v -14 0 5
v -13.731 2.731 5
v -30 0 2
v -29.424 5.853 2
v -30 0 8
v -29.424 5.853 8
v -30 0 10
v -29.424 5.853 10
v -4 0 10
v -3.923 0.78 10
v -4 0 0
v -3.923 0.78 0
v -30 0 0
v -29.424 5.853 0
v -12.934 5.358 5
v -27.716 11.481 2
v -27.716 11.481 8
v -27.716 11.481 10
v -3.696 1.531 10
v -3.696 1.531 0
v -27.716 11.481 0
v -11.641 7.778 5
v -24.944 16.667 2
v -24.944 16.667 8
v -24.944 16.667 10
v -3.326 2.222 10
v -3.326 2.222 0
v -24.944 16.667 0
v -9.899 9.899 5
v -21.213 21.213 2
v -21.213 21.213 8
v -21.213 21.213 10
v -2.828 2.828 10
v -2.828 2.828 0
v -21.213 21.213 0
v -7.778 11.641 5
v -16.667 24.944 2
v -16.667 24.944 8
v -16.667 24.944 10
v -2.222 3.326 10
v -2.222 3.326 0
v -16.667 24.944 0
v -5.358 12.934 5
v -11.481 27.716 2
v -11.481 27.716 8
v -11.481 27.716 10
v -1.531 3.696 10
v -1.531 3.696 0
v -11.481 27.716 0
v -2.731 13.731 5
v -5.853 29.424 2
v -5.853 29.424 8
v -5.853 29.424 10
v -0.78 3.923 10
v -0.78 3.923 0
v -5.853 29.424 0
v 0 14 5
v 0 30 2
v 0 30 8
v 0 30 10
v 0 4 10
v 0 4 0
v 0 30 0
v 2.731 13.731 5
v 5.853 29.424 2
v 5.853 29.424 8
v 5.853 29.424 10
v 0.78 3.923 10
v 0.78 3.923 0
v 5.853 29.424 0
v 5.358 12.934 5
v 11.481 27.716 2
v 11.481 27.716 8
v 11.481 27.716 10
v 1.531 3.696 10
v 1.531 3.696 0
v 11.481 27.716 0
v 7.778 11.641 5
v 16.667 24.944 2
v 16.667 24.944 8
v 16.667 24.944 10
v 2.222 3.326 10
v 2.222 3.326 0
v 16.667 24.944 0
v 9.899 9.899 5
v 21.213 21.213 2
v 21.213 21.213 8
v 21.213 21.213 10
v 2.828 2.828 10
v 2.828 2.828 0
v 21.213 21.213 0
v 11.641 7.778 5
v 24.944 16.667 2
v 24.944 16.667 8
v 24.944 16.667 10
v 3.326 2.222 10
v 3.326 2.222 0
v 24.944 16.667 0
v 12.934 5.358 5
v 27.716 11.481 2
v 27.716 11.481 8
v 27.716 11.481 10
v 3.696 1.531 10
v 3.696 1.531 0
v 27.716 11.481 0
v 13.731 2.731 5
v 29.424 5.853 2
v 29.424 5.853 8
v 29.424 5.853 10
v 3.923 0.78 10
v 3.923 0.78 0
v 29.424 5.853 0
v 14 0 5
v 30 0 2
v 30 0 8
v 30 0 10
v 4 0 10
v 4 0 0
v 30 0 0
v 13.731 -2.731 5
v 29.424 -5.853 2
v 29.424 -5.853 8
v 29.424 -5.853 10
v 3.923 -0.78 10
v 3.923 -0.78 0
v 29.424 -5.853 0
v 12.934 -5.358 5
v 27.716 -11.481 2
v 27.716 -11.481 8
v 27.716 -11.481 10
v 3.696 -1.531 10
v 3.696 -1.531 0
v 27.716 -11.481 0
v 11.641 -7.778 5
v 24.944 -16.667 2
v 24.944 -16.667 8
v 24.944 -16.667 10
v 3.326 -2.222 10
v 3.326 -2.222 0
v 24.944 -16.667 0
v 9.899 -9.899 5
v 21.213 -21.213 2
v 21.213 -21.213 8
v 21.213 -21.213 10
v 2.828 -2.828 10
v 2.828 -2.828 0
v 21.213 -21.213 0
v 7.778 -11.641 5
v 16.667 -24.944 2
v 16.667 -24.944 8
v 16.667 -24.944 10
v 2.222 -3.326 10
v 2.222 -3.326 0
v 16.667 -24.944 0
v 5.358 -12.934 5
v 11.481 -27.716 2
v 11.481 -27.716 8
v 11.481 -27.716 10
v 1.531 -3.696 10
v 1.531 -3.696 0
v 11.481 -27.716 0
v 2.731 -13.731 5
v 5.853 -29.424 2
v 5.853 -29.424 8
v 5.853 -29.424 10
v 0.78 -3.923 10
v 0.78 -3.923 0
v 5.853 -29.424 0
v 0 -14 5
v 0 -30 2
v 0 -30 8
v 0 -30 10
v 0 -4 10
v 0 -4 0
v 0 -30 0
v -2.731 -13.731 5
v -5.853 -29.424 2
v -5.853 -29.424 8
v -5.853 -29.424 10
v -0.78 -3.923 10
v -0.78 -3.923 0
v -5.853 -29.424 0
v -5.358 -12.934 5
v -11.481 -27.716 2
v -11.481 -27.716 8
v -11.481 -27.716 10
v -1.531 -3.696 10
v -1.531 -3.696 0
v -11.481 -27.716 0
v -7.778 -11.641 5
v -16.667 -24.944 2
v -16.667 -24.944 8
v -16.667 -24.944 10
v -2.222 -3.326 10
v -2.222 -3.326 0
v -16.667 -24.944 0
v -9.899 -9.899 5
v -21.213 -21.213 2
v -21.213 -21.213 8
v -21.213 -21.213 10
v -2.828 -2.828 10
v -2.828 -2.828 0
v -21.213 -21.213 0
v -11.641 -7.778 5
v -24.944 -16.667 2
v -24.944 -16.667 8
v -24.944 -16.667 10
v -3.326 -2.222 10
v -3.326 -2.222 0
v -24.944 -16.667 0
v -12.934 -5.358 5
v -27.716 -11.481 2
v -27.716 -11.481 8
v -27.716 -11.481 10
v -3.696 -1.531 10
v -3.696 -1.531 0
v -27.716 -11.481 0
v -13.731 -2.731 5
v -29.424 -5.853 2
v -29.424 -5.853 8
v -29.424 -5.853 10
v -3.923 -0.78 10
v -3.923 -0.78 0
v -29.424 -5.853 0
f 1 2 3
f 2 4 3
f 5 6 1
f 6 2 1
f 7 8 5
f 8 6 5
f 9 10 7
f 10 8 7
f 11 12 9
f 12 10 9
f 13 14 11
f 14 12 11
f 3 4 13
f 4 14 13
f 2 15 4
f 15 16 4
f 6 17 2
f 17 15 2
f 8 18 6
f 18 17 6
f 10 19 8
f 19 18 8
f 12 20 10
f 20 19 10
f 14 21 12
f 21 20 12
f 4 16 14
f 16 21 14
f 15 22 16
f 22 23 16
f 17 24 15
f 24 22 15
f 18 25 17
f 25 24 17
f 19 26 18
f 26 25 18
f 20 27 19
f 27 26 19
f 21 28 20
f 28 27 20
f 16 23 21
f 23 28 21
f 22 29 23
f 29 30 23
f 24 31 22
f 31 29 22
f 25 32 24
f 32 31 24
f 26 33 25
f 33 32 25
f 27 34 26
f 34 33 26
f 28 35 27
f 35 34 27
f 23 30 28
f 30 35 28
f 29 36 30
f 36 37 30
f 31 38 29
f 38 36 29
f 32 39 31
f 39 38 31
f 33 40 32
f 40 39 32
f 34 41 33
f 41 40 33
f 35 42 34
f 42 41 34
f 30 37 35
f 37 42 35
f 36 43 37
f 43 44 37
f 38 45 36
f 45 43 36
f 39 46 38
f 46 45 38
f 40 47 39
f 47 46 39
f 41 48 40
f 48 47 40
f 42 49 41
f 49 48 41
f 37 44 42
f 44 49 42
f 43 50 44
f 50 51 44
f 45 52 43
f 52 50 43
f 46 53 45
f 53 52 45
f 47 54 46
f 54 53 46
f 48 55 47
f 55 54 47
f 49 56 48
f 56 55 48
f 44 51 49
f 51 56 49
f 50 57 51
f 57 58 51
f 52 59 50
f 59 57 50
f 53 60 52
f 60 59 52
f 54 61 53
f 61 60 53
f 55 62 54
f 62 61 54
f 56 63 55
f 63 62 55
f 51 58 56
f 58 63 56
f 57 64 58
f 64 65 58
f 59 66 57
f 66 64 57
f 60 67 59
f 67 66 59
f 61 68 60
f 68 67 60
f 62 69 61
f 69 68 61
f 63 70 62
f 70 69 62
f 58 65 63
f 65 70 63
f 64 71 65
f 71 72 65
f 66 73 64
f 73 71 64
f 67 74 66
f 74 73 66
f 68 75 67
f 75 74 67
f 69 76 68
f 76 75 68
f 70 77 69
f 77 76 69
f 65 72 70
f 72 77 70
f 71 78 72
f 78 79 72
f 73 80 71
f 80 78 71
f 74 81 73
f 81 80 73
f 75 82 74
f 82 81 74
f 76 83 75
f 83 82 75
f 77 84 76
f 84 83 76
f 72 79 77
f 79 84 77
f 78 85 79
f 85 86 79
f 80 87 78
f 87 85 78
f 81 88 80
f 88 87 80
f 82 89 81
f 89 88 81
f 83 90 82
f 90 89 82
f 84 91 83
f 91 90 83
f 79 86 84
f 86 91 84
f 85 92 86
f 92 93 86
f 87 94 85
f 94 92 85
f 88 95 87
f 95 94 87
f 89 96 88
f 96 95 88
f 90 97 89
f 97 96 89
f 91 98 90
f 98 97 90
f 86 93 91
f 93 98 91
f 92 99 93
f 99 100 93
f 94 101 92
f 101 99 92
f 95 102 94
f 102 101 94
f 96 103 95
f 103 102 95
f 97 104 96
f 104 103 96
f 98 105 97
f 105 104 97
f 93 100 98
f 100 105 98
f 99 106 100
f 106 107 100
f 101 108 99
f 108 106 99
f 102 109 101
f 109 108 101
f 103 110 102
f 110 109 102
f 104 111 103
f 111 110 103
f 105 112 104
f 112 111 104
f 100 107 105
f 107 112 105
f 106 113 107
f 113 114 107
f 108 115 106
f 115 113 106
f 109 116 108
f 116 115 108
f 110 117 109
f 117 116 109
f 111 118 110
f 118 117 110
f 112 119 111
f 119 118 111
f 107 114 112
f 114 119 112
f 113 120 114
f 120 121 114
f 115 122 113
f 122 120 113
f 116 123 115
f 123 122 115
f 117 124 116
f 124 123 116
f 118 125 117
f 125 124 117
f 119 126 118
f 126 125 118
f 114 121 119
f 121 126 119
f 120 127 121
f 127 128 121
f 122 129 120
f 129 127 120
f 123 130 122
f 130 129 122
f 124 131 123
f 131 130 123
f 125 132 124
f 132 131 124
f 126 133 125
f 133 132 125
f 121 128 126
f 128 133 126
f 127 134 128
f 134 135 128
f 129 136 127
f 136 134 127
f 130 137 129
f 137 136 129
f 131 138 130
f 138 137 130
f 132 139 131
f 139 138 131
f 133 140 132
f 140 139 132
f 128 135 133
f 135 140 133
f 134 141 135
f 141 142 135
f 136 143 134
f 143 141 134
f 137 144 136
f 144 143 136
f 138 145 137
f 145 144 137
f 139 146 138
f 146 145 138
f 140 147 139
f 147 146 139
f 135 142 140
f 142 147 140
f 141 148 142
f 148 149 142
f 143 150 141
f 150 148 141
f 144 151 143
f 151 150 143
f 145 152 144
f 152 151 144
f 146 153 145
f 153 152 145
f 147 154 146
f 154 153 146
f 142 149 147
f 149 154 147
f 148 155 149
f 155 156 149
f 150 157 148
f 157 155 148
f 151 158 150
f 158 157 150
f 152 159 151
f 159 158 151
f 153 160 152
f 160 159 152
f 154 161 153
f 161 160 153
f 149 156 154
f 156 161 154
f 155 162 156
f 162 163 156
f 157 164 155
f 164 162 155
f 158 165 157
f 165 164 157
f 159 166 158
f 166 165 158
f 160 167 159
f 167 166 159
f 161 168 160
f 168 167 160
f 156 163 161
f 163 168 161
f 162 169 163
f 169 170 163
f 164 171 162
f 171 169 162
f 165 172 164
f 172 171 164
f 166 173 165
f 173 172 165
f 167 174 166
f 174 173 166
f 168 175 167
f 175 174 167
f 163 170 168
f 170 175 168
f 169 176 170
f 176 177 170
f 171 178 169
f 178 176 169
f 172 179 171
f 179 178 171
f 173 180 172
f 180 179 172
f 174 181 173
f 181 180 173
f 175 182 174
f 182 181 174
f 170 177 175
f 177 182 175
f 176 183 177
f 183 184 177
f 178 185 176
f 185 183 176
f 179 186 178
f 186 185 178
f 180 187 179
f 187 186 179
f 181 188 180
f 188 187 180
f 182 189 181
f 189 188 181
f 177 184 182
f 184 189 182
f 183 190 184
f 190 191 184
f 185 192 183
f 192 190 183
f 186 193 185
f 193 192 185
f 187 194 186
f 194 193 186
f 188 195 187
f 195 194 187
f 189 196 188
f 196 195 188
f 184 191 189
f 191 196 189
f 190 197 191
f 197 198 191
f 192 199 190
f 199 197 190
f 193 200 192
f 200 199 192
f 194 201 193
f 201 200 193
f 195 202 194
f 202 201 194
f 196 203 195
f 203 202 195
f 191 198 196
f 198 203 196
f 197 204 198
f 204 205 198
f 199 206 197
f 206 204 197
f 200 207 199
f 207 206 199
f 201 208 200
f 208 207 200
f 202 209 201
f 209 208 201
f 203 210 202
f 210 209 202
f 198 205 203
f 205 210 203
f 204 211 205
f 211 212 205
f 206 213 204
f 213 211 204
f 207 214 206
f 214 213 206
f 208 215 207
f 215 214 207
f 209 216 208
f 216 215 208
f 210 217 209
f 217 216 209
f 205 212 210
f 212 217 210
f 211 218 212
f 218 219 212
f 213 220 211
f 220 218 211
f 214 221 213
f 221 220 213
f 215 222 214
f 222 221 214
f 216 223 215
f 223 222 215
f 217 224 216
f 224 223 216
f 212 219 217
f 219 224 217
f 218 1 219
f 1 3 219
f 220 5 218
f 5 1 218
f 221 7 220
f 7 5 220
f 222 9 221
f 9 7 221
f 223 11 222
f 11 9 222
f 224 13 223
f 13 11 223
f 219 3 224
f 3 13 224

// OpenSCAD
$fn = 32;

// ----------------------------------------------------------------------
// Revolved part: V-groove pulley R30
// ----------------------------------------------------------------------

// --- parameters (mm) ---
bore_r = 4;               // bore radius
rim_r = 30;               // rim radius
rim_t = 10;               // rim width
groove_r = 14;            // groove root radius
groove_w = 3;             // groove half width
revolve_angle = 360;      // revolve sweep, degrees

bore_d = 2 * bore_r;
rim_d = 2 * rim_r;
groove_d = 2 * groove_r;

profile = [[4, 0], [30, 0], [30, 2], [14, 5], [30, 8], [30, 10], [4, 10]];  // primary outline, 7 points, counter clockwise

// --- the one profile operation ---
rotate_extrude(angle = revolve_angle) polygon(points = profile);
